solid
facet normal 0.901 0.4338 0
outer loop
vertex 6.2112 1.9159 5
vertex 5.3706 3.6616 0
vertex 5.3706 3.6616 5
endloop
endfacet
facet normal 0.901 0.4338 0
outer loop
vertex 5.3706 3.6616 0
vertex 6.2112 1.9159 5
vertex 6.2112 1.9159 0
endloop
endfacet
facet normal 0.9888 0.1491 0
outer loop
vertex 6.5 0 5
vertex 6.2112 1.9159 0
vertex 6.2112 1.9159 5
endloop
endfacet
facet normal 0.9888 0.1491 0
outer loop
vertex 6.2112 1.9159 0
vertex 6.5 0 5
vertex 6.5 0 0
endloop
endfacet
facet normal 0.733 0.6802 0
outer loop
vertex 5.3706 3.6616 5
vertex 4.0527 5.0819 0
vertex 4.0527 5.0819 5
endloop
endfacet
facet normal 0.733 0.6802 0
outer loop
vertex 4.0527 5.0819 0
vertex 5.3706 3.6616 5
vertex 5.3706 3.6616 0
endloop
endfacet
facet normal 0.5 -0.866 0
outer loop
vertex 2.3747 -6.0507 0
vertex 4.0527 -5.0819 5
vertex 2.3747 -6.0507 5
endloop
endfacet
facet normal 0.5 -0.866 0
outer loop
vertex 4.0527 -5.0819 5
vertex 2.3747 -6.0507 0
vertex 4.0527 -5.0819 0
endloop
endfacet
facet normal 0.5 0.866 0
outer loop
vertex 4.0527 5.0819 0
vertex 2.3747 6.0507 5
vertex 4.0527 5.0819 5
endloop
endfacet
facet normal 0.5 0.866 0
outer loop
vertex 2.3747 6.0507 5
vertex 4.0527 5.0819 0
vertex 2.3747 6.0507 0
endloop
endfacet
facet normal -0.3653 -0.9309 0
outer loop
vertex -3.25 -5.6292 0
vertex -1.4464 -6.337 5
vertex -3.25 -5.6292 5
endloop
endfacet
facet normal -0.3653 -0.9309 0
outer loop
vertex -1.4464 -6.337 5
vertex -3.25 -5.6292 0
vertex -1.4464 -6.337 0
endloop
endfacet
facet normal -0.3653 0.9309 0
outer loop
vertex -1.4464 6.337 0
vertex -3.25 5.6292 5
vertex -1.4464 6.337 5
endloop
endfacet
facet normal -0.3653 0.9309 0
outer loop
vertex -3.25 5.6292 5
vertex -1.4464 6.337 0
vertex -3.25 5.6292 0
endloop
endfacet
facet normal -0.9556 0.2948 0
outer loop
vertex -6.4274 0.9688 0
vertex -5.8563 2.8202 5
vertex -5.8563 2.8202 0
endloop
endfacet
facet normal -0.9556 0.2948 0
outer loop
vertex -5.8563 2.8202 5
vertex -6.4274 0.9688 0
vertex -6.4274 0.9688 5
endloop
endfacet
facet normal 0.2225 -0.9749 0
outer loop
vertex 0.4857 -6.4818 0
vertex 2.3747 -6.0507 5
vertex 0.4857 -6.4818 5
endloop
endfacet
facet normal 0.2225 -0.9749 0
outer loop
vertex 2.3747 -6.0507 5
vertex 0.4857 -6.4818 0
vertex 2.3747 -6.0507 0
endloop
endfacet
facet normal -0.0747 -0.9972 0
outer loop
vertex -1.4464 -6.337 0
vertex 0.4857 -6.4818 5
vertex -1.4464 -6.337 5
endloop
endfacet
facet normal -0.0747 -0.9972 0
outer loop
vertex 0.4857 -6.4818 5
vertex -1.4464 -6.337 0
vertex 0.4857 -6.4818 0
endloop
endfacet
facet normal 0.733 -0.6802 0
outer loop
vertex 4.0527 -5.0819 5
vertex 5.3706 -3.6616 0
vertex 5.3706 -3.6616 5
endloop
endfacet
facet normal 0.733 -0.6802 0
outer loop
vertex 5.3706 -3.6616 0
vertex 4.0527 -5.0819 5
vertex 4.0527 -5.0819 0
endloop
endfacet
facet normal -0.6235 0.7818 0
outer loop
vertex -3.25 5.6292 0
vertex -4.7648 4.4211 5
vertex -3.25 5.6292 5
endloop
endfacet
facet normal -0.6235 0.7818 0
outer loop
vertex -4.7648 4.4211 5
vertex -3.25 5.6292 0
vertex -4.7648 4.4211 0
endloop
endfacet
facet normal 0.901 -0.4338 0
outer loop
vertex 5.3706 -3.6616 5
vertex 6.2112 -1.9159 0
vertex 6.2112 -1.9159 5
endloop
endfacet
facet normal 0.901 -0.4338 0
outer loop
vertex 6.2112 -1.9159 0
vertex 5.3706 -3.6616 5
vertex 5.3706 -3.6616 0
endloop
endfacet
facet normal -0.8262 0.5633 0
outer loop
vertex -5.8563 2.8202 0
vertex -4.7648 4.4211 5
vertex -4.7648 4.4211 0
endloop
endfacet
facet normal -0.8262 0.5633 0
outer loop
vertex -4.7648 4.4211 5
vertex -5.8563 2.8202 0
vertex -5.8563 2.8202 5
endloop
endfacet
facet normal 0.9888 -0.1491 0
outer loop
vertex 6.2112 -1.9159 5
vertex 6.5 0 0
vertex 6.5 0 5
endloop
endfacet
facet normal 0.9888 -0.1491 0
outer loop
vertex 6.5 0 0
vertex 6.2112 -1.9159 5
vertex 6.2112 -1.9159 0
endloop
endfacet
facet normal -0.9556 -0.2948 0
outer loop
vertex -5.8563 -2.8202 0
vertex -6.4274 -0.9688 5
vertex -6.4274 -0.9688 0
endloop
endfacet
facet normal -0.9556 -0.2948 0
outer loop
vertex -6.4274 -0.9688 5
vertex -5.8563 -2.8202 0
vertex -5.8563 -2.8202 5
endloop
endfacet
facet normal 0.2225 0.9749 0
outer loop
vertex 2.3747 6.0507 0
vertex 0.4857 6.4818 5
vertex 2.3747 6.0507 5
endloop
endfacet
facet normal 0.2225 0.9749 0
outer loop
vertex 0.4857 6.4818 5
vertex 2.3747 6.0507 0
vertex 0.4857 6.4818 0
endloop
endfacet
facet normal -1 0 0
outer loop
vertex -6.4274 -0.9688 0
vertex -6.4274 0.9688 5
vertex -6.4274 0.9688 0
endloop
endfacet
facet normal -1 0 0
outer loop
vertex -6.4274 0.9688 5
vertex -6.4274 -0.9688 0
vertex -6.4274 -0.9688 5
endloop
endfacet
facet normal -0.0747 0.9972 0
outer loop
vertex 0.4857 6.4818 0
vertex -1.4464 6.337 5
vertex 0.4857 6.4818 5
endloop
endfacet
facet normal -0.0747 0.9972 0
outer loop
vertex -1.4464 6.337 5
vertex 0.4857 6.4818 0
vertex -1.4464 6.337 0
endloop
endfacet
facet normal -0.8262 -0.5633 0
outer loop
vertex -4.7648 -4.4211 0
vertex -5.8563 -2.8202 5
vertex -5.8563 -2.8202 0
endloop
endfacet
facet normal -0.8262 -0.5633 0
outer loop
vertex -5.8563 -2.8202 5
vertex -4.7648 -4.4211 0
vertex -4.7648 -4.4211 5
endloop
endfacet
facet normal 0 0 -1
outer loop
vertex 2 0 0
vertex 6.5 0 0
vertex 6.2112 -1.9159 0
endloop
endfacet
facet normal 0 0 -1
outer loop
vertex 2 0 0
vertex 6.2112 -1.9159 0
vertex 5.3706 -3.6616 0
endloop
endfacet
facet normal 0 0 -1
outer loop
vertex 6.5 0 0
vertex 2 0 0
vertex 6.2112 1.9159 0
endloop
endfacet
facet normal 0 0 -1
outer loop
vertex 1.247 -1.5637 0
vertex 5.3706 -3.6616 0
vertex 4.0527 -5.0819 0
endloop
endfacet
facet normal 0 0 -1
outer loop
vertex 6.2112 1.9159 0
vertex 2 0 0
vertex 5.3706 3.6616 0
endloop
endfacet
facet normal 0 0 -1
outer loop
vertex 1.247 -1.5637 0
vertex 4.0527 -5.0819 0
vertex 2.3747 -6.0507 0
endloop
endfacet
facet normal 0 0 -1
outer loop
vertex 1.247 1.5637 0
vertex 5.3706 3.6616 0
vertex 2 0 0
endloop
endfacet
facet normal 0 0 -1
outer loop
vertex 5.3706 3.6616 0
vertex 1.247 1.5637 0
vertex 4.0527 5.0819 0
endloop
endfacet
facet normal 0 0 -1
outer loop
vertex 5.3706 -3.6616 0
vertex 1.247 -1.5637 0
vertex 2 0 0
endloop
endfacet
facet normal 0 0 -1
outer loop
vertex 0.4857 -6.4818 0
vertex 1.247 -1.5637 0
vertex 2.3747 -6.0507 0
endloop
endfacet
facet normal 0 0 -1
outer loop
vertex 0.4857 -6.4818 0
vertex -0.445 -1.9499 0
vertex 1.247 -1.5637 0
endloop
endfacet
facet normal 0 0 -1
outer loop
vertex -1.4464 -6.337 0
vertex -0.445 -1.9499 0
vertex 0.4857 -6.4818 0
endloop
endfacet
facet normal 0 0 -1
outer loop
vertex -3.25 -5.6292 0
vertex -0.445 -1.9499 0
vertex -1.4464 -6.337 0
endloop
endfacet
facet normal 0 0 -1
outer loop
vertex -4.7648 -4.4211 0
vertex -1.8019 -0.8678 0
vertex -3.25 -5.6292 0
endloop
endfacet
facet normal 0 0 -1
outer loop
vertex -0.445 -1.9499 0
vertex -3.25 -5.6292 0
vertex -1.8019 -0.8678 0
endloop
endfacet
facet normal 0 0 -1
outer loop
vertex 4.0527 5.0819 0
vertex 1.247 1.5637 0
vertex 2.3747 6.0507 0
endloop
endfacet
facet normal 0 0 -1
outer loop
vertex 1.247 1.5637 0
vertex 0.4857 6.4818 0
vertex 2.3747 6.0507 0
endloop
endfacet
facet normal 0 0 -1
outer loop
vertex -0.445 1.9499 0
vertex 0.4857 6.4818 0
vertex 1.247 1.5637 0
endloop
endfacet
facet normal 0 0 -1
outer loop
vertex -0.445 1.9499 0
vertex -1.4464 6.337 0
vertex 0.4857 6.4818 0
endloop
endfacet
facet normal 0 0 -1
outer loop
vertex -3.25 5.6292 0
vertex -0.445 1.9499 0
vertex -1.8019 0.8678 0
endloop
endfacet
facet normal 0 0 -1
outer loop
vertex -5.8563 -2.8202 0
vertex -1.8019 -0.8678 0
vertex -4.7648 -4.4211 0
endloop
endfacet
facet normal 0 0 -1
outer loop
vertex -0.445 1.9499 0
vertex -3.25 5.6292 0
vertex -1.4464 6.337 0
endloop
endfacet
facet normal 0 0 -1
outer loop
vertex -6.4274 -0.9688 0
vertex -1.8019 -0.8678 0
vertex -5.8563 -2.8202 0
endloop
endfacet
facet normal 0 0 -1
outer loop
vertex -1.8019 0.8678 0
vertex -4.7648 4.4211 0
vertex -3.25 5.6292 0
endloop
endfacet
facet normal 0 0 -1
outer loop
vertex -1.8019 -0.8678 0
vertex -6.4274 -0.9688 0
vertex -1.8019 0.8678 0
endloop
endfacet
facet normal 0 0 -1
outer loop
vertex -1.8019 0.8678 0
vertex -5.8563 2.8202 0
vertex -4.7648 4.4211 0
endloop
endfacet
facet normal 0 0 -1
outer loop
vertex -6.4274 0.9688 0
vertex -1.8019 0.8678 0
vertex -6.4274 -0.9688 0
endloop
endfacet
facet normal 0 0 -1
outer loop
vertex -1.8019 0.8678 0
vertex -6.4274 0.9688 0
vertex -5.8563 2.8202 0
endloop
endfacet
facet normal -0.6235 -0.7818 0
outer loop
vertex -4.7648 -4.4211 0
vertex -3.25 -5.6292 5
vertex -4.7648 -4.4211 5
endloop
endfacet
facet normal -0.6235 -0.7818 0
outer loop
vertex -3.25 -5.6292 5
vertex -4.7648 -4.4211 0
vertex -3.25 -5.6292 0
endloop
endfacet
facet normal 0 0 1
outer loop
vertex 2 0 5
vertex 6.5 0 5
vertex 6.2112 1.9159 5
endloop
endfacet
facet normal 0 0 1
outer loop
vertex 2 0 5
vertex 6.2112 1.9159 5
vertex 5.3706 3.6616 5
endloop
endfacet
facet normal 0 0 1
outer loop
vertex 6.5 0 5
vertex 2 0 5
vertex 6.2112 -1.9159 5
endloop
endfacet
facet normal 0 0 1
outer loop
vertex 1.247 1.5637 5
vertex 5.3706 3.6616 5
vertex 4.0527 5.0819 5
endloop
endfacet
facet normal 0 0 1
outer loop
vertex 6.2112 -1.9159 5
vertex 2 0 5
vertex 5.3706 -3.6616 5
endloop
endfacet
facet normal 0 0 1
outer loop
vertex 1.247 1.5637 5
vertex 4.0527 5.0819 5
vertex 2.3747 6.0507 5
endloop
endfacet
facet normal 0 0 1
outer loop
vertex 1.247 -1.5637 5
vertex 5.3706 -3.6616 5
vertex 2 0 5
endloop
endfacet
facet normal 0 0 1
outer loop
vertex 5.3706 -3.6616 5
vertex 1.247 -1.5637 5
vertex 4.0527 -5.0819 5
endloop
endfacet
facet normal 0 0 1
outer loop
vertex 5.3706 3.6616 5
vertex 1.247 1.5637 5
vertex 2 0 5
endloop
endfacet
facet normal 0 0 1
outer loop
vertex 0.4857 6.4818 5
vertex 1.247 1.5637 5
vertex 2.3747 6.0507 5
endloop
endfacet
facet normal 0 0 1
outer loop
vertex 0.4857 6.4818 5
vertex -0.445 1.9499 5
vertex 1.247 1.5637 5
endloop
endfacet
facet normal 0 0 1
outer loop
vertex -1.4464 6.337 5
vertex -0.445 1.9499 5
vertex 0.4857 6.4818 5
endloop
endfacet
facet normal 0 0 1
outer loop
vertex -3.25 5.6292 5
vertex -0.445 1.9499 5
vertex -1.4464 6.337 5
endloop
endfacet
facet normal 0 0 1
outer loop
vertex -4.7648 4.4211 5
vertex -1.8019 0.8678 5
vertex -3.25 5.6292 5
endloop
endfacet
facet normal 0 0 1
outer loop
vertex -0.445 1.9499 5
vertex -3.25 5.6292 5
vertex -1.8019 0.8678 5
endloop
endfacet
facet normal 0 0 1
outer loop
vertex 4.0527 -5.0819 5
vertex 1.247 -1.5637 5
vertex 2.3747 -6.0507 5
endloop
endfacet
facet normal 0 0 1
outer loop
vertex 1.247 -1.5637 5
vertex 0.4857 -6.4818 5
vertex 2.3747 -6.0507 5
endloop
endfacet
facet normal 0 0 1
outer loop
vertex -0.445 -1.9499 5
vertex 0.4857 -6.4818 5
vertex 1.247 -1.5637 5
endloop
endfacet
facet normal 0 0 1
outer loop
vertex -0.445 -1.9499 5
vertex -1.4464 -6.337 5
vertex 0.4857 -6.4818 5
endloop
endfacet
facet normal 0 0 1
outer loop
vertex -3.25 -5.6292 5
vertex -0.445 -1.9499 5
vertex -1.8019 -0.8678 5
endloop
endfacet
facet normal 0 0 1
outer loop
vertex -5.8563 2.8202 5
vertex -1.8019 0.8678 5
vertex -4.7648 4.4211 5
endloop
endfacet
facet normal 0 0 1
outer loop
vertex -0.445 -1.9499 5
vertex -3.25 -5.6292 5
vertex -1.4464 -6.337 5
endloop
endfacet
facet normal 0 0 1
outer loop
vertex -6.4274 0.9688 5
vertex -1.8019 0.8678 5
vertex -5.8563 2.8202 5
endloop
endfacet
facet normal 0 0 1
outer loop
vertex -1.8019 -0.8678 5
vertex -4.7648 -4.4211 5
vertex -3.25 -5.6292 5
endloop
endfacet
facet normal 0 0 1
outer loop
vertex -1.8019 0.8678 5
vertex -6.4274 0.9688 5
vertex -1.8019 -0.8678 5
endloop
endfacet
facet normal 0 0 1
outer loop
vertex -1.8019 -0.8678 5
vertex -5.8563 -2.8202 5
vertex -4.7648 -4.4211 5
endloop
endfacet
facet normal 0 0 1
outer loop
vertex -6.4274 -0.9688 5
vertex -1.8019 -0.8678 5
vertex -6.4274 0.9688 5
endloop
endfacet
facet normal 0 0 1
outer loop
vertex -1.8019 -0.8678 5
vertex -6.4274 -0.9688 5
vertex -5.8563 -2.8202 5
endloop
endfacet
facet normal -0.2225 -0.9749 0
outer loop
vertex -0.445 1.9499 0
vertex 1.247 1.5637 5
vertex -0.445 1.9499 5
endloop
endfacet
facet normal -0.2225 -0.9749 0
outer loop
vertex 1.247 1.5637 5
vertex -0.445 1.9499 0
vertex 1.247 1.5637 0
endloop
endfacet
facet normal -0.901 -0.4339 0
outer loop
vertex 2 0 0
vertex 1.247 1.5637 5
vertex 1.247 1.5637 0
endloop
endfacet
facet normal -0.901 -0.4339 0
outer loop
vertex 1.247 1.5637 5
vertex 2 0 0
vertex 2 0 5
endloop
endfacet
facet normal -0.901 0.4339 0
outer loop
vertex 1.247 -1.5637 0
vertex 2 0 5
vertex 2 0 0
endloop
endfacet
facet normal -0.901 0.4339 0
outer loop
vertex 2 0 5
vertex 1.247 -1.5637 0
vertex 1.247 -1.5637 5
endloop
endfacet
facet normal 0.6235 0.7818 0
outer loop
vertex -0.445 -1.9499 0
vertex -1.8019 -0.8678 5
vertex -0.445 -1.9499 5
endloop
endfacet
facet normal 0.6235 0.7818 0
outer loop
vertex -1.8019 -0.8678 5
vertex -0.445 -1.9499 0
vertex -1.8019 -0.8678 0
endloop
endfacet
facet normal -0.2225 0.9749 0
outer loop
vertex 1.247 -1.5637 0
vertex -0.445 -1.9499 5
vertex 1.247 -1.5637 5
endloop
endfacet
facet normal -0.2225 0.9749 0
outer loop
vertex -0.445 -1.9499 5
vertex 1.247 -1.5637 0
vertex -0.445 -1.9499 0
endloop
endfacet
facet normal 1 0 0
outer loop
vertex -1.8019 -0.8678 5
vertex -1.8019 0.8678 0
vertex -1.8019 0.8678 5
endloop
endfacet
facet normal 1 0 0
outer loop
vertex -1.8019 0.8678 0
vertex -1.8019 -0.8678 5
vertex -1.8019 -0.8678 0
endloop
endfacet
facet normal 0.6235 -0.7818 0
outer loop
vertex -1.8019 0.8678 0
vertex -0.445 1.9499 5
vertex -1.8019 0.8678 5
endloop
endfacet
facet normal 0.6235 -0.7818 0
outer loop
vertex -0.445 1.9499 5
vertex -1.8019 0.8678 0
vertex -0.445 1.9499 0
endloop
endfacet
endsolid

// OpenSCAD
//This is my attempt to model a bearing.


//Create a bearing by specifying internal diameter, external diameter and width.
module Bearing(int_Diameter,ext_Diameter,width)
	{
	echo("********************************************");
	echo("Creating bearing with following dimensions");
	echo("Internal Diameter: ",int_Diameter);
	echo("External Diameter: ",ext_Diameter);
	echo("Width: ",width);
	echo("********************************************");



	//create external cylinder minus internal cylinder
	difference()
		{
		bearingExternalGeom(ext_Diameter,width);
		cylinder(width,int_Diameter/2,int_Diameter/2);
		}
	


//	translate([-side_length/2,-head_size/2,0]) cube([side_length,head_size,head_depth]);
	//rotate([0,0,120]) translate([-side_length/2,-head_size/2,0])cube([side_length,head_size,head_depth]);
	//rotate([0,0,240]) translate([-side_length/2,-head_size/2,0])cube([side_length,head_size,head_depth]);
	
	//Add shaft offset by depth of head
	//shaft_radius=diameter/2;
//	translate([0,0,head_depth]) cylinder(length,shaft_radius,shaft_radius);
	}

//use for getting external geometry only (for binary commands)
module bearingExternalGeom(ext_Diameter,width)
	{
	cylinder(width,ext_Diameter/2,ext_Diameter/2);
	
	}

//Parameters ***********************************
//Internal diameter
int_Diameter=4;

//External Diameter
ext_Diameter=13;

//width
width=5;

//608=8,22,7
//624=4,13,5
//**********************************************

Bearing(int_Diameter,ext_Diameter,width);
